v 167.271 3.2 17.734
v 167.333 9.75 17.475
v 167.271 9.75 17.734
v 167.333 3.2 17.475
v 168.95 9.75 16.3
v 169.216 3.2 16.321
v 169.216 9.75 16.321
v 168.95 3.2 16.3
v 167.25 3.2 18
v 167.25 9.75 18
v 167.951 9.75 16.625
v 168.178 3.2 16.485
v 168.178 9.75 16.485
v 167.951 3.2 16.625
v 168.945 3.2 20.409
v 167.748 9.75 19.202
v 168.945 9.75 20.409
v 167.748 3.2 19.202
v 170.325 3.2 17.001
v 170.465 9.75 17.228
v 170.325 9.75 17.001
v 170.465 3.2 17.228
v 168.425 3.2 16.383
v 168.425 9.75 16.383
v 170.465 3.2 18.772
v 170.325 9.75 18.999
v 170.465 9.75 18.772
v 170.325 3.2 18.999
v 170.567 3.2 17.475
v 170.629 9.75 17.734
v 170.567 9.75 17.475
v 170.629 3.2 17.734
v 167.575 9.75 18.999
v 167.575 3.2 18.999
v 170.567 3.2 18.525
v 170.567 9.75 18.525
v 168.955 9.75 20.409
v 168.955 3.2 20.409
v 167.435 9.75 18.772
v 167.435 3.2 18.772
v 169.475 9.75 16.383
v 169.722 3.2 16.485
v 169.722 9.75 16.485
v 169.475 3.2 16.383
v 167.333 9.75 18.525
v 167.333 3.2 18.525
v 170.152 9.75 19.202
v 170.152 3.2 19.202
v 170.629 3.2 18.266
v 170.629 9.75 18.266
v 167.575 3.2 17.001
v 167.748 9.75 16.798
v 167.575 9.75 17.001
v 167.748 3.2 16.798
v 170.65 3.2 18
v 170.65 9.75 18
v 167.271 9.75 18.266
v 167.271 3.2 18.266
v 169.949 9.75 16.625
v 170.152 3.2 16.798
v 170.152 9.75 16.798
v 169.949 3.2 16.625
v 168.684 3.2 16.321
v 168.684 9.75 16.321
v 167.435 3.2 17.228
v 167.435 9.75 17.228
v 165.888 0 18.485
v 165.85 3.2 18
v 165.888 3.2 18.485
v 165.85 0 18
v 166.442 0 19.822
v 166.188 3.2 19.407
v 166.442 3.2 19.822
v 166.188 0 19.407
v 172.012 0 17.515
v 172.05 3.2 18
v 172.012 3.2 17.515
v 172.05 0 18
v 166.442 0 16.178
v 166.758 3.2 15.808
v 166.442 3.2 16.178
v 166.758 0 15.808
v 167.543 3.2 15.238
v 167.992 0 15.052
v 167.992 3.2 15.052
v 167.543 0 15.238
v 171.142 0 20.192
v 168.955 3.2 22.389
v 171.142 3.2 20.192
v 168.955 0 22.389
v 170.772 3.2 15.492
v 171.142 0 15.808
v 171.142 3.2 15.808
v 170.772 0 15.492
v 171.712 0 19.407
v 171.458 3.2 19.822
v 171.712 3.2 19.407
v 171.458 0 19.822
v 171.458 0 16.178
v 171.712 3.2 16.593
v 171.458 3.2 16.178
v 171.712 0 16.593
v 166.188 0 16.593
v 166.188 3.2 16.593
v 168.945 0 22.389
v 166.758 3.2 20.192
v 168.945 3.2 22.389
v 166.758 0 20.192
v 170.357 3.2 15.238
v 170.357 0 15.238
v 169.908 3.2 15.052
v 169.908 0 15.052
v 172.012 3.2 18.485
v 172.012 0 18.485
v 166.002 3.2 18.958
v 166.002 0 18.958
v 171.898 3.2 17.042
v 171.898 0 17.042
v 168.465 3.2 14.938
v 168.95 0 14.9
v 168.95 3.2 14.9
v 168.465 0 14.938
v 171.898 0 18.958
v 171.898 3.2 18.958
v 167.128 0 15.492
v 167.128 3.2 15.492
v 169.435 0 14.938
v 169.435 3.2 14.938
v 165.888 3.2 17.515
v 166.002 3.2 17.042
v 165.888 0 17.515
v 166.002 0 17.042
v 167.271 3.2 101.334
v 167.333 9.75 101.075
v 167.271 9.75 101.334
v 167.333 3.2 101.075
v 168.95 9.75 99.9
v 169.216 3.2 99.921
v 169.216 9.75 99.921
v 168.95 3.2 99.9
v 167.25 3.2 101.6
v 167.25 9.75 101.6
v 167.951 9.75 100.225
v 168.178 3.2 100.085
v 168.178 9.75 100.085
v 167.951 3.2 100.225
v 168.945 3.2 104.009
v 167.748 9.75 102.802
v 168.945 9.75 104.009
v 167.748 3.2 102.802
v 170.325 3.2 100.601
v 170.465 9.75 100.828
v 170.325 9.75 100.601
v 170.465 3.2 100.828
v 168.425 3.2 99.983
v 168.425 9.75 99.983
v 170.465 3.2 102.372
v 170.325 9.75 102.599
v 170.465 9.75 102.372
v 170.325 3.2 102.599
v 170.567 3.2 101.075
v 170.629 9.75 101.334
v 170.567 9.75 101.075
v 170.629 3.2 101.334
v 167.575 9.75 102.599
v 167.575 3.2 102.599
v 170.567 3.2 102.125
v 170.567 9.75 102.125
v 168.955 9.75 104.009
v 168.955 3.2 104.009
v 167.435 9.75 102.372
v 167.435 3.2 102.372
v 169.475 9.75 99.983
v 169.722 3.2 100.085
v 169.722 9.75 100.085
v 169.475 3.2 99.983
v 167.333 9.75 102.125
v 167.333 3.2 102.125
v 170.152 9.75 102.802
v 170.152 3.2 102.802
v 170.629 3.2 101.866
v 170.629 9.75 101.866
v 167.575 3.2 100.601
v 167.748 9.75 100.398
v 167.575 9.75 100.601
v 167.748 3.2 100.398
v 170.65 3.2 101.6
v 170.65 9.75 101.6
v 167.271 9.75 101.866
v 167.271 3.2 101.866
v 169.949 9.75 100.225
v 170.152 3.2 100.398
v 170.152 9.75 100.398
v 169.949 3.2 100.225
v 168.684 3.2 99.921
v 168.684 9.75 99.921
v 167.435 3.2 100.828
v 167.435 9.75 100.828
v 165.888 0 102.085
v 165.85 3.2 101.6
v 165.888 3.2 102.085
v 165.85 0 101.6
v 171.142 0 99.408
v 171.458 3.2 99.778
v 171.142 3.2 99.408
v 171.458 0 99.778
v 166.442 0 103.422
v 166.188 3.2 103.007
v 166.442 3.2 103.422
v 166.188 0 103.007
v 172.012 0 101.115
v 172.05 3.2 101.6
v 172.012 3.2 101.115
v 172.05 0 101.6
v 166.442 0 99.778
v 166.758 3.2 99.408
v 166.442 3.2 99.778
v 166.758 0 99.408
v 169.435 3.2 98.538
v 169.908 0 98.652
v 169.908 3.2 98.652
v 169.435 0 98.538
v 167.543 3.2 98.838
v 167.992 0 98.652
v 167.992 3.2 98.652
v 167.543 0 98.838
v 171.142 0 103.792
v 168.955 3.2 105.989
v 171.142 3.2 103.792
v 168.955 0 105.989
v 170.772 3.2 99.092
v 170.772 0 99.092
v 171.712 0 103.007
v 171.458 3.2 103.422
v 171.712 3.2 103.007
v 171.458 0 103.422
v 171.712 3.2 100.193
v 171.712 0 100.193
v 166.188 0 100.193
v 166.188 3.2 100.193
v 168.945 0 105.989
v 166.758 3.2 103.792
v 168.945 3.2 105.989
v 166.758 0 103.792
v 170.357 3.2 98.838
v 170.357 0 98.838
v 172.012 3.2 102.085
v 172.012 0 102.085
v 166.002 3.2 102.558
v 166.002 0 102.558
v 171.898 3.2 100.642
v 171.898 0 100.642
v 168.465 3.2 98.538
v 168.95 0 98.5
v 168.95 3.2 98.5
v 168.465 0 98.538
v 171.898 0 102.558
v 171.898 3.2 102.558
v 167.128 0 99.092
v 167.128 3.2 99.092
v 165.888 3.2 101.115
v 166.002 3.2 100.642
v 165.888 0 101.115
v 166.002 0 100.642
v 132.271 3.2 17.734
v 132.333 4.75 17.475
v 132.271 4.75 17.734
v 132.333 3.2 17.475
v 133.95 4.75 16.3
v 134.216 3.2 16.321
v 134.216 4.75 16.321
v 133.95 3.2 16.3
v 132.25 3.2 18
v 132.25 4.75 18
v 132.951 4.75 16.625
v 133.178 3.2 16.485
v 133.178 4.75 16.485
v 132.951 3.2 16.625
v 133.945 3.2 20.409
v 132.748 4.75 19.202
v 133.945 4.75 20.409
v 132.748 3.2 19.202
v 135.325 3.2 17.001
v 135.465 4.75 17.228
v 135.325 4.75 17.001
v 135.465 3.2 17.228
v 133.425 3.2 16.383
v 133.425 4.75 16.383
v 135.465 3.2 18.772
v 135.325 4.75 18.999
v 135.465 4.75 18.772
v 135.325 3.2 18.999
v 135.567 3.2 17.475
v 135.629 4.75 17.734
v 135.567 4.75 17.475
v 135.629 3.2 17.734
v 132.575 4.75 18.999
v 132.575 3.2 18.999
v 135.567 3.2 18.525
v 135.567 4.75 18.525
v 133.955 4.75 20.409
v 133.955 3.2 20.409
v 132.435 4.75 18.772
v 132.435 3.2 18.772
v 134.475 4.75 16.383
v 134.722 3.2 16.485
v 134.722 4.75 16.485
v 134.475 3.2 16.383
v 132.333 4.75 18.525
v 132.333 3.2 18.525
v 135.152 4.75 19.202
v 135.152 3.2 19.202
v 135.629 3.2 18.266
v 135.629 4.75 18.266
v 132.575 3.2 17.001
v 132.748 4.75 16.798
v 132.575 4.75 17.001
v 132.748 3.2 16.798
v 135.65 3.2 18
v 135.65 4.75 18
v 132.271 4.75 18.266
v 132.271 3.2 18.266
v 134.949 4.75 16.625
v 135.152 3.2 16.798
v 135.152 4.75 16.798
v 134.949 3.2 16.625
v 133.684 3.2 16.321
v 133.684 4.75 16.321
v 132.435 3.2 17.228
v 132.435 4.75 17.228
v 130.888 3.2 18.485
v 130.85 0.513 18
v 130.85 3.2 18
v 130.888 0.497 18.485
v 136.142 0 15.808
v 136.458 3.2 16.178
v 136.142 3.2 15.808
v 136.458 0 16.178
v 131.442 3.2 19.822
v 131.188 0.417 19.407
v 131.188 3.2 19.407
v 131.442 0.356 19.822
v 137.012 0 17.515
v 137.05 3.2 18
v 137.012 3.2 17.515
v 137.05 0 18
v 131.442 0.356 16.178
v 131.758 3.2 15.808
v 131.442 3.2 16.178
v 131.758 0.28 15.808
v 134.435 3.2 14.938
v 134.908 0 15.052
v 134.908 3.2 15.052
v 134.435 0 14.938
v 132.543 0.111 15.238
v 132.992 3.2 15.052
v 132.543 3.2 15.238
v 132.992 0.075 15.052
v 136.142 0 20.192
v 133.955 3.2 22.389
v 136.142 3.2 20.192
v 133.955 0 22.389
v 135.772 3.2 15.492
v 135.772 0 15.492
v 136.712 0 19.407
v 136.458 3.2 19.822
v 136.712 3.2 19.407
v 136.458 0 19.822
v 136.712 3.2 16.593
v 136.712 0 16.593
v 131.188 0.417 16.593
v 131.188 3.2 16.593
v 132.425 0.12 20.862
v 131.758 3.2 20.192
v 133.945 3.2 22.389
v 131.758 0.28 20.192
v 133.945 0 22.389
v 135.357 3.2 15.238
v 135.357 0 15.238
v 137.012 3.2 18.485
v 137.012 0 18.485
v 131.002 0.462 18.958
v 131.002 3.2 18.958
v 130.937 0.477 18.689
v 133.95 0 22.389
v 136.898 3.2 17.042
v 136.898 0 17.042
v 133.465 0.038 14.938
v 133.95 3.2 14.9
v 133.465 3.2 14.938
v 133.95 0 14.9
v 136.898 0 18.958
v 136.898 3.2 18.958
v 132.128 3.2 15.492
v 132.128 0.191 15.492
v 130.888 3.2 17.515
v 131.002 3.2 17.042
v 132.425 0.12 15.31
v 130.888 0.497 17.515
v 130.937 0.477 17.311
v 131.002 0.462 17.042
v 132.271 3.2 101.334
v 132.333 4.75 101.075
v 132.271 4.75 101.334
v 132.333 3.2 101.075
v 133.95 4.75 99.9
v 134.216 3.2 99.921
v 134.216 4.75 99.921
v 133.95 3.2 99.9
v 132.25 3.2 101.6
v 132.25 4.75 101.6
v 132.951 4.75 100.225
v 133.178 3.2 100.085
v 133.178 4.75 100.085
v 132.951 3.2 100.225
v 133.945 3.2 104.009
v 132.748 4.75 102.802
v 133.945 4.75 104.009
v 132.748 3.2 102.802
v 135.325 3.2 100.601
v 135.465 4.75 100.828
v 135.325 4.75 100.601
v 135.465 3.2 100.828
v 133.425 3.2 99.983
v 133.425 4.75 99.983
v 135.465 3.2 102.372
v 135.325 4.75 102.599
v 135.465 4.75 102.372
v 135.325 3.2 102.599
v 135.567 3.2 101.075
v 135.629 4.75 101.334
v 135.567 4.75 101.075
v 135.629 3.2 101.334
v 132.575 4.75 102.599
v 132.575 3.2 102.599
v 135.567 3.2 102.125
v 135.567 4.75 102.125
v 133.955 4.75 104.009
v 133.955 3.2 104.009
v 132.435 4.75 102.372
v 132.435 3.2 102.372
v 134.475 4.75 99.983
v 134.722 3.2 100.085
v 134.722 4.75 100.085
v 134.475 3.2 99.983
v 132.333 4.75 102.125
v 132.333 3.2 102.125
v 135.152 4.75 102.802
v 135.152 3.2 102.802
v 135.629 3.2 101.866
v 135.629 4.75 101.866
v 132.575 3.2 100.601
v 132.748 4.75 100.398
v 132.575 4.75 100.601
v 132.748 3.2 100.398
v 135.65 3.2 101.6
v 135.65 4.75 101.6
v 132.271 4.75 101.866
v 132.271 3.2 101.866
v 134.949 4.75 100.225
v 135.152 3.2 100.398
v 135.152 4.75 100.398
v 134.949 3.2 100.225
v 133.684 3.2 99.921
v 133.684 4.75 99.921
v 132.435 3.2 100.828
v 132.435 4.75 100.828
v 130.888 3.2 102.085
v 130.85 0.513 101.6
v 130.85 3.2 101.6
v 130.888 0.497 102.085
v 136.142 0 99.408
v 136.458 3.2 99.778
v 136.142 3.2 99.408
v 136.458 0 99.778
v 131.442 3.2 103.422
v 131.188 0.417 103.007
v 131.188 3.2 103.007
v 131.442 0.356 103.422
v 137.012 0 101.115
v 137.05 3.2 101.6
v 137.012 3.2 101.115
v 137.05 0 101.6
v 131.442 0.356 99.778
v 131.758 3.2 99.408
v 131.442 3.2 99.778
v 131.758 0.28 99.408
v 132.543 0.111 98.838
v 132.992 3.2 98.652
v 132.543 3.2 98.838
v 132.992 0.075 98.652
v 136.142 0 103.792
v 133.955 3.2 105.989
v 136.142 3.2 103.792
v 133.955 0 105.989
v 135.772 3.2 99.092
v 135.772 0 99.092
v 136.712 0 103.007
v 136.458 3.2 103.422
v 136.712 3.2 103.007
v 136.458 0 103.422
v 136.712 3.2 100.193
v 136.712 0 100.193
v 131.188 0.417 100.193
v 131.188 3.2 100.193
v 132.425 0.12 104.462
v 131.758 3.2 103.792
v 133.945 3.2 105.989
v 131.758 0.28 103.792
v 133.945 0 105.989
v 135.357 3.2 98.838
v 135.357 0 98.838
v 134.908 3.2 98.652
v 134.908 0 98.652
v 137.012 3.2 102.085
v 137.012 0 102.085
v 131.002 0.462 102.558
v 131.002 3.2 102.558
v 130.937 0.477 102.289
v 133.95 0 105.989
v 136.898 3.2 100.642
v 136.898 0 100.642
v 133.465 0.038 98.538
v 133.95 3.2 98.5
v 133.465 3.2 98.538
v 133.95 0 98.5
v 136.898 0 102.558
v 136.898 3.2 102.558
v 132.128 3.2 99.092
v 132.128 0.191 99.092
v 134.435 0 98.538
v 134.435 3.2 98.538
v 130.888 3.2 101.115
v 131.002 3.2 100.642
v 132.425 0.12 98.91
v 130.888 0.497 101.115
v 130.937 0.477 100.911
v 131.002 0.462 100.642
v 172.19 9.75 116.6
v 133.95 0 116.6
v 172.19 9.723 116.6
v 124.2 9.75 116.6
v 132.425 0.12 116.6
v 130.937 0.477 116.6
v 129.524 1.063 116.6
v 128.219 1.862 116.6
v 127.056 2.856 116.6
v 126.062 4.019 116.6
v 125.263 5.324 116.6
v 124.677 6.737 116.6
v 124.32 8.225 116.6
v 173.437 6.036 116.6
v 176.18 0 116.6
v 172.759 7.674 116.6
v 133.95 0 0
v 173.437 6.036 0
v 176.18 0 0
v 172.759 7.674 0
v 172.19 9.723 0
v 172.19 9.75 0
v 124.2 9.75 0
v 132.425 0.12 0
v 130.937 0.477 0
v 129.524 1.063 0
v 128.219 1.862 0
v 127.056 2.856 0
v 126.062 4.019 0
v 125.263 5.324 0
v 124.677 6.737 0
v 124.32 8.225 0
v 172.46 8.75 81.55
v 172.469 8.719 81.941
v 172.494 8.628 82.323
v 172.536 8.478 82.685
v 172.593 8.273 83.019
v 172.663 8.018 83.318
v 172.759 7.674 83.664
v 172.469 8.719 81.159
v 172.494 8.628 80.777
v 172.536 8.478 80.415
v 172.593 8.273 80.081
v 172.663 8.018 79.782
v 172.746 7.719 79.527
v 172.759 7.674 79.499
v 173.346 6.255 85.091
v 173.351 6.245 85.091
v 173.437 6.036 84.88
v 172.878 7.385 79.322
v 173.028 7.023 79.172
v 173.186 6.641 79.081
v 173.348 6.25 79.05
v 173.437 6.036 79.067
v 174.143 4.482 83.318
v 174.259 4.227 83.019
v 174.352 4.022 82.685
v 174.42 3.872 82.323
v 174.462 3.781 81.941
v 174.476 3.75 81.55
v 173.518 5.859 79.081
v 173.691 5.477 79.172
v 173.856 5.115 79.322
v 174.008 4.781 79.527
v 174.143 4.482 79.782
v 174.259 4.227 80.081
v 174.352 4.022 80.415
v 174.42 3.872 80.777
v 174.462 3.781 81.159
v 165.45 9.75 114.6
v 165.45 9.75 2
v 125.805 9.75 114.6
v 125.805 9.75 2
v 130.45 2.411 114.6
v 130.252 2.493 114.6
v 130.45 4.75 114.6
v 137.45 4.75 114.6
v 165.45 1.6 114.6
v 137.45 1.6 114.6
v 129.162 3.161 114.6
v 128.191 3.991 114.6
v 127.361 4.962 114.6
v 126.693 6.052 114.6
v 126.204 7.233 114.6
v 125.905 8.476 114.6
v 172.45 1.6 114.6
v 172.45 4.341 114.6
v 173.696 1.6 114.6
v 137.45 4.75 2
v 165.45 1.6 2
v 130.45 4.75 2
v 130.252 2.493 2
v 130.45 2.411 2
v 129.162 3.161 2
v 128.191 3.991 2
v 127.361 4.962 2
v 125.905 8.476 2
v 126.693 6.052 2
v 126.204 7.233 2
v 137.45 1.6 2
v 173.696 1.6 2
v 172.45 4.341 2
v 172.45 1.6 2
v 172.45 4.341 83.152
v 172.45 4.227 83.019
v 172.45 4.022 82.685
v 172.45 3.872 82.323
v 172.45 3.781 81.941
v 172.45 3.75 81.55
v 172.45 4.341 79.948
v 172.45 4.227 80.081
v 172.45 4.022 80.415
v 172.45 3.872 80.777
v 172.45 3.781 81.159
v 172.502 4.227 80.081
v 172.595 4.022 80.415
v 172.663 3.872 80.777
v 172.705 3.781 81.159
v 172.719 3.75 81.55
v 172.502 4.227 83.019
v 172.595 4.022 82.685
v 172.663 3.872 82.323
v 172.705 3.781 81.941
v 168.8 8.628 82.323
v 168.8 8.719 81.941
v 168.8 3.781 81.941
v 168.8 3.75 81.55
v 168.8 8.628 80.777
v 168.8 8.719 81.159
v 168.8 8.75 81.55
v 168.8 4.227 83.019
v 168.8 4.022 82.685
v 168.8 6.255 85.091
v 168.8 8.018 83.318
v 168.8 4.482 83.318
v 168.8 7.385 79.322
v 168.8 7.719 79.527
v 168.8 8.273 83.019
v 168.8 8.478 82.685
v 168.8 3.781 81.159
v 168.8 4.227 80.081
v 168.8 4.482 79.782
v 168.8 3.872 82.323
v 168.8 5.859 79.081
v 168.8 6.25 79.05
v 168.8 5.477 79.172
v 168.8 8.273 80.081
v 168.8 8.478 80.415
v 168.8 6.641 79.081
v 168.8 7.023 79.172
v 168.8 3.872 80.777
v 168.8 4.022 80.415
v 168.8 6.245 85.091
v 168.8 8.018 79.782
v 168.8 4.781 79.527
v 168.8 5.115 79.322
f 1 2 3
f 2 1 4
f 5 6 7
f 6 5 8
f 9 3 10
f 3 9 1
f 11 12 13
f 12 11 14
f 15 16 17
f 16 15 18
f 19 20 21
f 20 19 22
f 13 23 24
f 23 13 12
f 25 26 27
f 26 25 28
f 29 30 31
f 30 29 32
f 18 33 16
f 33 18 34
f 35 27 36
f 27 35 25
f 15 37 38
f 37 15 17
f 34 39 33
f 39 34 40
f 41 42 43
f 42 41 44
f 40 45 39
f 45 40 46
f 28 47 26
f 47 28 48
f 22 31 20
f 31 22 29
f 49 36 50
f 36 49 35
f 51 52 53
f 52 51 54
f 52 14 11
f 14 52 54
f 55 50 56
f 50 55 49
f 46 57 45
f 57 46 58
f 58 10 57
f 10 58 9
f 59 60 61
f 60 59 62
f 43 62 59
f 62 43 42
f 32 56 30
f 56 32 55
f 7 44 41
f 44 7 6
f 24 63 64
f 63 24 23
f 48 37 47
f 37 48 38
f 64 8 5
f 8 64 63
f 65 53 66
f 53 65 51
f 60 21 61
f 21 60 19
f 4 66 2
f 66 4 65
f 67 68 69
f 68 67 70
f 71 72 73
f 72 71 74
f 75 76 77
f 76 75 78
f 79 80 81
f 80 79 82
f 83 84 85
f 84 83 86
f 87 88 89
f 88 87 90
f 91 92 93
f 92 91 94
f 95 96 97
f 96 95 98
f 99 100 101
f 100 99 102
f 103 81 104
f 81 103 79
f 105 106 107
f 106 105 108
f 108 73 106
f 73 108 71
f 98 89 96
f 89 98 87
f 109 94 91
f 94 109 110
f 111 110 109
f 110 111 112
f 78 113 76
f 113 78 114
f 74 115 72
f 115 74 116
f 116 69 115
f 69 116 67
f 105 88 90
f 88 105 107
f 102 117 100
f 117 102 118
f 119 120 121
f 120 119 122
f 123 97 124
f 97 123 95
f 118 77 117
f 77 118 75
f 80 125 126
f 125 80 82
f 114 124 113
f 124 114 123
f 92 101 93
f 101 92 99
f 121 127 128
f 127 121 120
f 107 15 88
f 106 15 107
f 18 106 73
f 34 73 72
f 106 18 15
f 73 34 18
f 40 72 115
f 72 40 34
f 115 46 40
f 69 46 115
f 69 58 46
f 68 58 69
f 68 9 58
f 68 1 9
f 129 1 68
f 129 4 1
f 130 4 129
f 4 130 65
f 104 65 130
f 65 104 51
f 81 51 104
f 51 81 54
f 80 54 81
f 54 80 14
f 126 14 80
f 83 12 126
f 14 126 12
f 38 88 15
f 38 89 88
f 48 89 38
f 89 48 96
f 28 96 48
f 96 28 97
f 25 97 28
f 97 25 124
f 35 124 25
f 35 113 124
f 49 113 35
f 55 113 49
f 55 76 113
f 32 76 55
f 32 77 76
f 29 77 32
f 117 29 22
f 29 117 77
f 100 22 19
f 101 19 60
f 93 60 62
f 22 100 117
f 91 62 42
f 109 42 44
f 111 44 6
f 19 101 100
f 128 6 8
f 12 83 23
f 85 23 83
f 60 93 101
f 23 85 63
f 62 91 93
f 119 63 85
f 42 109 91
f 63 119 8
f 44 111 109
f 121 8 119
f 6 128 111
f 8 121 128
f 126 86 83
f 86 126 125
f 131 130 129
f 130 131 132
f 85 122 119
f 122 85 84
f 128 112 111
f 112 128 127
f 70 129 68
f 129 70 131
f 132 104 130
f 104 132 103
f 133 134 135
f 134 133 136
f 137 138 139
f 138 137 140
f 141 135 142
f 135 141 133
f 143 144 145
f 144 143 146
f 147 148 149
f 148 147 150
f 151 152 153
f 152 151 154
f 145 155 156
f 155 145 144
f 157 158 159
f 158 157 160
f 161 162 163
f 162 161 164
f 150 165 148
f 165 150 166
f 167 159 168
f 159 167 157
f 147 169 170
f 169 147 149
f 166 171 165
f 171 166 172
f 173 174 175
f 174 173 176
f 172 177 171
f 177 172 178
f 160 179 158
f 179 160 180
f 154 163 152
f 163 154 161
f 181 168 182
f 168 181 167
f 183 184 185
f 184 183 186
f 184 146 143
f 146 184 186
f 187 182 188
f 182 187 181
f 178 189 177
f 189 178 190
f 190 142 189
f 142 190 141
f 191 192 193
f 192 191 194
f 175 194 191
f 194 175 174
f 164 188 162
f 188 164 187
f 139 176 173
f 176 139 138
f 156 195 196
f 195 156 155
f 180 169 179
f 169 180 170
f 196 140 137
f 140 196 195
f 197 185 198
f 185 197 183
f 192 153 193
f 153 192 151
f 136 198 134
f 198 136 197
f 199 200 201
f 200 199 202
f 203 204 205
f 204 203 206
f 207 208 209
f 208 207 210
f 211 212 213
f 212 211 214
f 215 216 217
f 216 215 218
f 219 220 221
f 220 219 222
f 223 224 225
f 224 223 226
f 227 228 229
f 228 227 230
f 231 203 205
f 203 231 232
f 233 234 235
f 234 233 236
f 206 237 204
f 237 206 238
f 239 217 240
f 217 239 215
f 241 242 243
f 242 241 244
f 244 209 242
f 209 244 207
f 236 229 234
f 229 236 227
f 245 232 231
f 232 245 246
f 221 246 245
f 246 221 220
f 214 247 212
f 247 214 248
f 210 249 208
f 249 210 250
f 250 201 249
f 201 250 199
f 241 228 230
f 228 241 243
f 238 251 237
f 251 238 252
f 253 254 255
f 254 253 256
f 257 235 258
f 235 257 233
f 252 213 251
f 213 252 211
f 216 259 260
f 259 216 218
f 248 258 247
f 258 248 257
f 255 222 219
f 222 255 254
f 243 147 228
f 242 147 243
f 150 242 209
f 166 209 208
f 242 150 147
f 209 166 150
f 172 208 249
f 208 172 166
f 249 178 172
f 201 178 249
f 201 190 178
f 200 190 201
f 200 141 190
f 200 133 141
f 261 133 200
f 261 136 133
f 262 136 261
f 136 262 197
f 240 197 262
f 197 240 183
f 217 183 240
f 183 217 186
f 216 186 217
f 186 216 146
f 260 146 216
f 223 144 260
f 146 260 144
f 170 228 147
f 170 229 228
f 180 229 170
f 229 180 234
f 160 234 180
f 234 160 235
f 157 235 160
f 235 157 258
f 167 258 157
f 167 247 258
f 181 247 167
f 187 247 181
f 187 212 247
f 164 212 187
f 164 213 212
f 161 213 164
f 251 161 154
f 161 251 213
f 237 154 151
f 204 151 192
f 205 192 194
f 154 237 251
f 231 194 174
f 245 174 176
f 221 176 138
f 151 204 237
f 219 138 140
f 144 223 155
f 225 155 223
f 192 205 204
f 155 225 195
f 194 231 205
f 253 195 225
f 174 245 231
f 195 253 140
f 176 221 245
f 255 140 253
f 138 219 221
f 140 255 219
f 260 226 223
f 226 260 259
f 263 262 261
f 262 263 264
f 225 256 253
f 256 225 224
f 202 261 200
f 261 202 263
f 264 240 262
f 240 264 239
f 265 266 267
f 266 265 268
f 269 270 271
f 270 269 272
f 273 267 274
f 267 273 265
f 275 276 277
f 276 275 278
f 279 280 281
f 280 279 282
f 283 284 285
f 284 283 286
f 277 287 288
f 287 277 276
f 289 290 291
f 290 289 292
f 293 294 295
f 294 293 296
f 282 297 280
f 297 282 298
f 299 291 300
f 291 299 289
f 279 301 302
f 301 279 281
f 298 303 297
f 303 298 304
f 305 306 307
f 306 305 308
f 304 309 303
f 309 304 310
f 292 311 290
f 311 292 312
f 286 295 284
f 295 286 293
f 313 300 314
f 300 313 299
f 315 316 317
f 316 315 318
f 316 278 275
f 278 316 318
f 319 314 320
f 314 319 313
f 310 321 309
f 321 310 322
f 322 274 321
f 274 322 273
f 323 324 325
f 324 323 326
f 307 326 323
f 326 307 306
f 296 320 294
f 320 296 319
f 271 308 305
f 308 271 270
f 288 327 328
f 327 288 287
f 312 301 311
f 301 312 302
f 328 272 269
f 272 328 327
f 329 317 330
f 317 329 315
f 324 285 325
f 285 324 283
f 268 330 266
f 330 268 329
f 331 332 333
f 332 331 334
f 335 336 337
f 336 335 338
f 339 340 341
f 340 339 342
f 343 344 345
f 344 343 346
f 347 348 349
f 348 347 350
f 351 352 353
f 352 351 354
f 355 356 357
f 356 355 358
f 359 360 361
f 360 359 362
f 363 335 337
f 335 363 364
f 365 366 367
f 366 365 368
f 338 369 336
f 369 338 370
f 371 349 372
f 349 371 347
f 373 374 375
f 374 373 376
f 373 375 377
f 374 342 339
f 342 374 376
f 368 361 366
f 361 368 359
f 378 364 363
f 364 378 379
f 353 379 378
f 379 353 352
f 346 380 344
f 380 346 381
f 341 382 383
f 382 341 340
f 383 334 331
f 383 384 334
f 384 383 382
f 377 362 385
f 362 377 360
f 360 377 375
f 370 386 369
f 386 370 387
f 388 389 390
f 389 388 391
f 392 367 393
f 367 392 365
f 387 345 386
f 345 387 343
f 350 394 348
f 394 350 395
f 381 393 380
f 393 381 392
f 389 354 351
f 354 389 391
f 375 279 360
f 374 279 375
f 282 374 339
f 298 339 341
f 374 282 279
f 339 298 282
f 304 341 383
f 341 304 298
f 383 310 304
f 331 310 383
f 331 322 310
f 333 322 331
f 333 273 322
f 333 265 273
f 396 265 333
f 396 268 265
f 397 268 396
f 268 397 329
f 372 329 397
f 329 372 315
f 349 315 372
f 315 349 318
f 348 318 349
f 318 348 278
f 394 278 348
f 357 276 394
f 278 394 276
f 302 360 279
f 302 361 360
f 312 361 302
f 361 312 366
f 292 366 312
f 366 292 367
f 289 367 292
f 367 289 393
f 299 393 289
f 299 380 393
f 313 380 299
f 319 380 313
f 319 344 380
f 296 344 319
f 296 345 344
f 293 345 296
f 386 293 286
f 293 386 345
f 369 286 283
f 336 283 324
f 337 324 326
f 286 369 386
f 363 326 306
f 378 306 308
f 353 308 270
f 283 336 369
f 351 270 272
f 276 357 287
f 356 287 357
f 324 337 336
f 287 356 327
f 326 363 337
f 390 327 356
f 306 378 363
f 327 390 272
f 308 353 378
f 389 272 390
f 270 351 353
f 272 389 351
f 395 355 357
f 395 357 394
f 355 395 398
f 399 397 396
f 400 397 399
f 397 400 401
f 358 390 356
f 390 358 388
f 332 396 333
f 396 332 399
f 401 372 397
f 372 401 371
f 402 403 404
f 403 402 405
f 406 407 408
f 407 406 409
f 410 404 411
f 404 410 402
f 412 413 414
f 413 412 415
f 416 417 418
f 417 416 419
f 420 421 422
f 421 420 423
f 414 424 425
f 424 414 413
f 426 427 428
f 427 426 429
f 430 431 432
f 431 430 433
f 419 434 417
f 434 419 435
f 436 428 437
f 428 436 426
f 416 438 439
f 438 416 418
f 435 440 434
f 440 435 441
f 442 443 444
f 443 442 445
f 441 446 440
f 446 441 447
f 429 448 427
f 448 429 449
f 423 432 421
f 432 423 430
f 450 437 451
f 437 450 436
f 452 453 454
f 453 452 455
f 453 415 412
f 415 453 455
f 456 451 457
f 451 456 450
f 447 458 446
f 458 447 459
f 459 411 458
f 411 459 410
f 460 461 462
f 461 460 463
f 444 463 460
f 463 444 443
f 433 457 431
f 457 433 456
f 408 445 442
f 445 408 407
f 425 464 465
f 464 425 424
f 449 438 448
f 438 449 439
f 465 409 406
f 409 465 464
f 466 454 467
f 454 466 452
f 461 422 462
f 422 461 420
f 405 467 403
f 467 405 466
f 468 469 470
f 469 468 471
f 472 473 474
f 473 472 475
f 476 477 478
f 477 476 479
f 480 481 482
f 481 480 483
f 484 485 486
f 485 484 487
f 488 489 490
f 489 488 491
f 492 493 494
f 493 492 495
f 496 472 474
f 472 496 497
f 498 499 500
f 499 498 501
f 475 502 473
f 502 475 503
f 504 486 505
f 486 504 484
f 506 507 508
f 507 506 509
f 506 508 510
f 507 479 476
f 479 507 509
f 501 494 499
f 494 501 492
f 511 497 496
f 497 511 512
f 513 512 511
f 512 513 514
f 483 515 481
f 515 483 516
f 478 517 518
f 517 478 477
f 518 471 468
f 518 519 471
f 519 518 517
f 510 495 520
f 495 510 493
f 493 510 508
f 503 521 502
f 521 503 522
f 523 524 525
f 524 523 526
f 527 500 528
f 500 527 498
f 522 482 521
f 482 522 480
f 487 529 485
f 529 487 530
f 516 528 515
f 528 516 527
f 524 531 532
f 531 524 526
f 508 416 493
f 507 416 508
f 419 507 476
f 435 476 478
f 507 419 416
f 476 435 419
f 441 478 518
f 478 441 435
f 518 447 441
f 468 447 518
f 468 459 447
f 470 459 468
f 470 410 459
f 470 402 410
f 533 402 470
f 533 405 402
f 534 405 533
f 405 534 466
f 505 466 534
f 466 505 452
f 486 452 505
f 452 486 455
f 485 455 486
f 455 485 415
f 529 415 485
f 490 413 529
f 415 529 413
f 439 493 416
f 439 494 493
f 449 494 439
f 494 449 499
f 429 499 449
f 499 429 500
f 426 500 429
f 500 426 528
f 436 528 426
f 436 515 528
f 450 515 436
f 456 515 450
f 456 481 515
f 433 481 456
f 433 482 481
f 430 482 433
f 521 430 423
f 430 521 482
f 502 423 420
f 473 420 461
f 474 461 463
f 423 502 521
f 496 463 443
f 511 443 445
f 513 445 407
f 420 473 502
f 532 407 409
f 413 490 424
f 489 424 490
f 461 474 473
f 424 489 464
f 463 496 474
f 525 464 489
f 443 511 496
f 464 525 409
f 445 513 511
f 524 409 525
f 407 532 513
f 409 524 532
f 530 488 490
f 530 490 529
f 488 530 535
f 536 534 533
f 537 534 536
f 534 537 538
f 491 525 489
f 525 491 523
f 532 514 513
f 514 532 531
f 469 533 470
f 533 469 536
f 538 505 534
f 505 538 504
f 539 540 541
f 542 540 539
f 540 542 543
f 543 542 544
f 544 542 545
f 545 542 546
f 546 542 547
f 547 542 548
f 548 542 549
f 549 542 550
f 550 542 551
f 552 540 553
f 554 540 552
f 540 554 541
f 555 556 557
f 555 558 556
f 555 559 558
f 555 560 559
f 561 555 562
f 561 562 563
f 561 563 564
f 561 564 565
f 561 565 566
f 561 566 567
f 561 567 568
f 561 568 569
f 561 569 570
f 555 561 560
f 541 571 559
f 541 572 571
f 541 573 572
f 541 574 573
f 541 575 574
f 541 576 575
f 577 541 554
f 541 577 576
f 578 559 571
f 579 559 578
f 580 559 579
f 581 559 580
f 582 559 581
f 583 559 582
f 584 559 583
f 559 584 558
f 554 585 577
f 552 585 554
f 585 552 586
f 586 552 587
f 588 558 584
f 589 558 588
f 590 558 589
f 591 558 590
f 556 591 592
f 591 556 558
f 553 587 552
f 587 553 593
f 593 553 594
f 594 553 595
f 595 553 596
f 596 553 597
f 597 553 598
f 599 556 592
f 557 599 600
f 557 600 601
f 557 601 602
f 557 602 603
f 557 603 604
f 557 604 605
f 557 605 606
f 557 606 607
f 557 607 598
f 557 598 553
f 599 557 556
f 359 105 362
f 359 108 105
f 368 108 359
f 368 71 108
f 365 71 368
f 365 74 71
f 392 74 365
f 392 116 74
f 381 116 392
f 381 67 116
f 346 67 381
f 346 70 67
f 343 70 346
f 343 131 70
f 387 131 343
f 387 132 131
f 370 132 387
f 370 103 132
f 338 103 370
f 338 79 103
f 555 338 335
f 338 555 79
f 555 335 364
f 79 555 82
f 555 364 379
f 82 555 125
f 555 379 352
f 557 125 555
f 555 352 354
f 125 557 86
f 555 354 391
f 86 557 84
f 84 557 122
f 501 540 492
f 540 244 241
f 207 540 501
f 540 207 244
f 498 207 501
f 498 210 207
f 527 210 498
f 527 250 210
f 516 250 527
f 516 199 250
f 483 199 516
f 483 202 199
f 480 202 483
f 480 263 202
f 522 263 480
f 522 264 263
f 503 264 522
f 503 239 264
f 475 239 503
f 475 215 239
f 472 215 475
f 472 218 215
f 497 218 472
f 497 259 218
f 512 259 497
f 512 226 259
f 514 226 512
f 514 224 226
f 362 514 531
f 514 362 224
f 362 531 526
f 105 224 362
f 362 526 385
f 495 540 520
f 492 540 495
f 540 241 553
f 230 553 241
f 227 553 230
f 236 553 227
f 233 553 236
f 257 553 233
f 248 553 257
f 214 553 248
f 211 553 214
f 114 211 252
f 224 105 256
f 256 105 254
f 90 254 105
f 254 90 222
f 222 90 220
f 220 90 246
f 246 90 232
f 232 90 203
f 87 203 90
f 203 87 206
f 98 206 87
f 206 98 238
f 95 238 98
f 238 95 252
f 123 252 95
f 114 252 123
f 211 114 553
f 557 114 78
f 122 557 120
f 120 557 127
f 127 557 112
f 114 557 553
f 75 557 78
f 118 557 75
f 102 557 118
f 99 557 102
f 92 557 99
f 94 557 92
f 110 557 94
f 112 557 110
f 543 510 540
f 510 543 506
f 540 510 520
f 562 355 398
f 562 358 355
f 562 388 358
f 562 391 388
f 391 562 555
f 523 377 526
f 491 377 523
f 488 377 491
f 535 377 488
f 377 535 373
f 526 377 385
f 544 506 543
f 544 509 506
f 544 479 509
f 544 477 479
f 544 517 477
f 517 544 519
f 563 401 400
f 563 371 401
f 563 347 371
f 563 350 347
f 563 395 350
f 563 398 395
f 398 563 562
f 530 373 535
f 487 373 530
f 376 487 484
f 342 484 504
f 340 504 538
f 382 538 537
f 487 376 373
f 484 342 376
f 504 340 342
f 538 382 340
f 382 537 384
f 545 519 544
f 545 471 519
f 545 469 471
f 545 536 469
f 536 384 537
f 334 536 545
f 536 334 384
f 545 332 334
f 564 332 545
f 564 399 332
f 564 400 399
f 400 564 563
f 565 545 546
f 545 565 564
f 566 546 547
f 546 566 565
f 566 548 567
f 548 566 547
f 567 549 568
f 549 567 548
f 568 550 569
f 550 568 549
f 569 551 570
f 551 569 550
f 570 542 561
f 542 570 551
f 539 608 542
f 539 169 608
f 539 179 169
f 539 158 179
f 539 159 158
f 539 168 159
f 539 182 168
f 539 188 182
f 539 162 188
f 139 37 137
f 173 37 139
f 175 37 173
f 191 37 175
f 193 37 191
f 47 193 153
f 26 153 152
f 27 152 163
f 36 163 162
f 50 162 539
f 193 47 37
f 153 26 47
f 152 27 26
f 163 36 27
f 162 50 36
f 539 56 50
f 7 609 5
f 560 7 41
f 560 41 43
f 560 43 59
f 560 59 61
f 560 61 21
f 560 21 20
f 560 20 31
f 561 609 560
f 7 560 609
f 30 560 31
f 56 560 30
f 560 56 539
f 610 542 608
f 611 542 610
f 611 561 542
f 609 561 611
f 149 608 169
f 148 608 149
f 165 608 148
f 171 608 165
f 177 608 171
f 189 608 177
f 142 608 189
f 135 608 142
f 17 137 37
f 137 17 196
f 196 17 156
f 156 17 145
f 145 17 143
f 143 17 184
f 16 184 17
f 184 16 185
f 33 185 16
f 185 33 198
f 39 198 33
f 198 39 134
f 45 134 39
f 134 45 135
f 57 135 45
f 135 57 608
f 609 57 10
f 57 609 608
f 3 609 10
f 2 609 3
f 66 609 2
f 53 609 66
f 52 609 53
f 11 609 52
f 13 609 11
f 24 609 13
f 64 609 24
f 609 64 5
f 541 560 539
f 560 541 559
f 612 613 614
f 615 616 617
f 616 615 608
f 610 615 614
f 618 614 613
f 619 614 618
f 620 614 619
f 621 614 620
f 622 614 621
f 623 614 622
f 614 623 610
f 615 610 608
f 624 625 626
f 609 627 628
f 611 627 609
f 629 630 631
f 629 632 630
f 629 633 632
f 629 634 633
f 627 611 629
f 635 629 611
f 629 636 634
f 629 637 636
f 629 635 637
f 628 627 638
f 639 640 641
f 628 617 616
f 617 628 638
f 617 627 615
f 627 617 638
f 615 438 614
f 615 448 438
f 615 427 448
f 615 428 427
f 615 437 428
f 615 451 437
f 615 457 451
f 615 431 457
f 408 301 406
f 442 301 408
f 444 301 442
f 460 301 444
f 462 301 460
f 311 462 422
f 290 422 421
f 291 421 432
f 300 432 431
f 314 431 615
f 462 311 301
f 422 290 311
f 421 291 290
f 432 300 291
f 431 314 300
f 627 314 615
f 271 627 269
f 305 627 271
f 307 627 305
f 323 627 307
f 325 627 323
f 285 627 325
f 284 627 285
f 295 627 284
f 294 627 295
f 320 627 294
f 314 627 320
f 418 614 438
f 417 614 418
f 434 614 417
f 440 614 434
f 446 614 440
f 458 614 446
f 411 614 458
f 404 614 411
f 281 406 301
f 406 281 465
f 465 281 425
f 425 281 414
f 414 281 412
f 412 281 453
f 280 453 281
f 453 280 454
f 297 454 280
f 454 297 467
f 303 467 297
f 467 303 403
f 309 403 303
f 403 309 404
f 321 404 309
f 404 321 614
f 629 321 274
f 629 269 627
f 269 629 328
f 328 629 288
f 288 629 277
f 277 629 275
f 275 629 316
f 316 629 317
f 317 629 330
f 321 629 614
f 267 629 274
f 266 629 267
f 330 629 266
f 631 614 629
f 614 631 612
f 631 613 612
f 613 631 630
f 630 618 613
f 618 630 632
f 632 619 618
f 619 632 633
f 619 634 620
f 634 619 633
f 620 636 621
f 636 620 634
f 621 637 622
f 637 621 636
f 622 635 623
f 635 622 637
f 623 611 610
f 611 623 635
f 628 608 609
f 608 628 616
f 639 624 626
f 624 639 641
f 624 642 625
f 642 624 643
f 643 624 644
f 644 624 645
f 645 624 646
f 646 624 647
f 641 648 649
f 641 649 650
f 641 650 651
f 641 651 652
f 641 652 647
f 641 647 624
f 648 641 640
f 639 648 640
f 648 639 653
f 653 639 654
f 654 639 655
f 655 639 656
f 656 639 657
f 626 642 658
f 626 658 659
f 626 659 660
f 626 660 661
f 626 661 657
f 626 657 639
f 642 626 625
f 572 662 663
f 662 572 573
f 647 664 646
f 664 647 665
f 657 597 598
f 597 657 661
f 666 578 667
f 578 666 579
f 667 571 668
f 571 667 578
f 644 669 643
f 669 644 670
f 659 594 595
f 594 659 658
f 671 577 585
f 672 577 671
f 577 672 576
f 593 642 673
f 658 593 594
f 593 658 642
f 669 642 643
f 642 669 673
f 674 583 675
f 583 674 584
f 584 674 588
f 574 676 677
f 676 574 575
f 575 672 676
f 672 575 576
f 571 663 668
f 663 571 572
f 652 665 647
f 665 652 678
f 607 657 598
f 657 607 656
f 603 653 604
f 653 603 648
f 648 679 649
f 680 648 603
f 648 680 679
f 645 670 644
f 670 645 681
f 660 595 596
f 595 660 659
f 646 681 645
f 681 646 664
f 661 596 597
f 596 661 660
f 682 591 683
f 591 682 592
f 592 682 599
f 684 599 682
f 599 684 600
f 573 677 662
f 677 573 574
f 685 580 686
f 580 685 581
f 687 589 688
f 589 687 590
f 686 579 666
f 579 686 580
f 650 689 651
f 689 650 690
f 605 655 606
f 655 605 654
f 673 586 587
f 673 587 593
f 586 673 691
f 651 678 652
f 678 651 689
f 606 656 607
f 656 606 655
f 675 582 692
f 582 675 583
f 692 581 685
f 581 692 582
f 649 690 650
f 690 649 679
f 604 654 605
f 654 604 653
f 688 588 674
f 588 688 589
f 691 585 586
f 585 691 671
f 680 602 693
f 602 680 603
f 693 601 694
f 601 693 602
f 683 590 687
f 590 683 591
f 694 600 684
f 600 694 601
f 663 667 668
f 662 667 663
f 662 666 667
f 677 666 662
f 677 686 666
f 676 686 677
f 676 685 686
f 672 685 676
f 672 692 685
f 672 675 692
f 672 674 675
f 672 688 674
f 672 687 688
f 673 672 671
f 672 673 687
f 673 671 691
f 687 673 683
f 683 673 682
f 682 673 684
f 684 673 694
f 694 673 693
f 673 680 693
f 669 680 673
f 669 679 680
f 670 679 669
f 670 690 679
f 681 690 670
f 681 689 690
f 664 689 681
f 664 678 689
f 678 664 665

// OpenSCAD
include <../lib/kobo-meshcore-case-lib.scad>;
$fn = 40;
electronics_cover_print();
